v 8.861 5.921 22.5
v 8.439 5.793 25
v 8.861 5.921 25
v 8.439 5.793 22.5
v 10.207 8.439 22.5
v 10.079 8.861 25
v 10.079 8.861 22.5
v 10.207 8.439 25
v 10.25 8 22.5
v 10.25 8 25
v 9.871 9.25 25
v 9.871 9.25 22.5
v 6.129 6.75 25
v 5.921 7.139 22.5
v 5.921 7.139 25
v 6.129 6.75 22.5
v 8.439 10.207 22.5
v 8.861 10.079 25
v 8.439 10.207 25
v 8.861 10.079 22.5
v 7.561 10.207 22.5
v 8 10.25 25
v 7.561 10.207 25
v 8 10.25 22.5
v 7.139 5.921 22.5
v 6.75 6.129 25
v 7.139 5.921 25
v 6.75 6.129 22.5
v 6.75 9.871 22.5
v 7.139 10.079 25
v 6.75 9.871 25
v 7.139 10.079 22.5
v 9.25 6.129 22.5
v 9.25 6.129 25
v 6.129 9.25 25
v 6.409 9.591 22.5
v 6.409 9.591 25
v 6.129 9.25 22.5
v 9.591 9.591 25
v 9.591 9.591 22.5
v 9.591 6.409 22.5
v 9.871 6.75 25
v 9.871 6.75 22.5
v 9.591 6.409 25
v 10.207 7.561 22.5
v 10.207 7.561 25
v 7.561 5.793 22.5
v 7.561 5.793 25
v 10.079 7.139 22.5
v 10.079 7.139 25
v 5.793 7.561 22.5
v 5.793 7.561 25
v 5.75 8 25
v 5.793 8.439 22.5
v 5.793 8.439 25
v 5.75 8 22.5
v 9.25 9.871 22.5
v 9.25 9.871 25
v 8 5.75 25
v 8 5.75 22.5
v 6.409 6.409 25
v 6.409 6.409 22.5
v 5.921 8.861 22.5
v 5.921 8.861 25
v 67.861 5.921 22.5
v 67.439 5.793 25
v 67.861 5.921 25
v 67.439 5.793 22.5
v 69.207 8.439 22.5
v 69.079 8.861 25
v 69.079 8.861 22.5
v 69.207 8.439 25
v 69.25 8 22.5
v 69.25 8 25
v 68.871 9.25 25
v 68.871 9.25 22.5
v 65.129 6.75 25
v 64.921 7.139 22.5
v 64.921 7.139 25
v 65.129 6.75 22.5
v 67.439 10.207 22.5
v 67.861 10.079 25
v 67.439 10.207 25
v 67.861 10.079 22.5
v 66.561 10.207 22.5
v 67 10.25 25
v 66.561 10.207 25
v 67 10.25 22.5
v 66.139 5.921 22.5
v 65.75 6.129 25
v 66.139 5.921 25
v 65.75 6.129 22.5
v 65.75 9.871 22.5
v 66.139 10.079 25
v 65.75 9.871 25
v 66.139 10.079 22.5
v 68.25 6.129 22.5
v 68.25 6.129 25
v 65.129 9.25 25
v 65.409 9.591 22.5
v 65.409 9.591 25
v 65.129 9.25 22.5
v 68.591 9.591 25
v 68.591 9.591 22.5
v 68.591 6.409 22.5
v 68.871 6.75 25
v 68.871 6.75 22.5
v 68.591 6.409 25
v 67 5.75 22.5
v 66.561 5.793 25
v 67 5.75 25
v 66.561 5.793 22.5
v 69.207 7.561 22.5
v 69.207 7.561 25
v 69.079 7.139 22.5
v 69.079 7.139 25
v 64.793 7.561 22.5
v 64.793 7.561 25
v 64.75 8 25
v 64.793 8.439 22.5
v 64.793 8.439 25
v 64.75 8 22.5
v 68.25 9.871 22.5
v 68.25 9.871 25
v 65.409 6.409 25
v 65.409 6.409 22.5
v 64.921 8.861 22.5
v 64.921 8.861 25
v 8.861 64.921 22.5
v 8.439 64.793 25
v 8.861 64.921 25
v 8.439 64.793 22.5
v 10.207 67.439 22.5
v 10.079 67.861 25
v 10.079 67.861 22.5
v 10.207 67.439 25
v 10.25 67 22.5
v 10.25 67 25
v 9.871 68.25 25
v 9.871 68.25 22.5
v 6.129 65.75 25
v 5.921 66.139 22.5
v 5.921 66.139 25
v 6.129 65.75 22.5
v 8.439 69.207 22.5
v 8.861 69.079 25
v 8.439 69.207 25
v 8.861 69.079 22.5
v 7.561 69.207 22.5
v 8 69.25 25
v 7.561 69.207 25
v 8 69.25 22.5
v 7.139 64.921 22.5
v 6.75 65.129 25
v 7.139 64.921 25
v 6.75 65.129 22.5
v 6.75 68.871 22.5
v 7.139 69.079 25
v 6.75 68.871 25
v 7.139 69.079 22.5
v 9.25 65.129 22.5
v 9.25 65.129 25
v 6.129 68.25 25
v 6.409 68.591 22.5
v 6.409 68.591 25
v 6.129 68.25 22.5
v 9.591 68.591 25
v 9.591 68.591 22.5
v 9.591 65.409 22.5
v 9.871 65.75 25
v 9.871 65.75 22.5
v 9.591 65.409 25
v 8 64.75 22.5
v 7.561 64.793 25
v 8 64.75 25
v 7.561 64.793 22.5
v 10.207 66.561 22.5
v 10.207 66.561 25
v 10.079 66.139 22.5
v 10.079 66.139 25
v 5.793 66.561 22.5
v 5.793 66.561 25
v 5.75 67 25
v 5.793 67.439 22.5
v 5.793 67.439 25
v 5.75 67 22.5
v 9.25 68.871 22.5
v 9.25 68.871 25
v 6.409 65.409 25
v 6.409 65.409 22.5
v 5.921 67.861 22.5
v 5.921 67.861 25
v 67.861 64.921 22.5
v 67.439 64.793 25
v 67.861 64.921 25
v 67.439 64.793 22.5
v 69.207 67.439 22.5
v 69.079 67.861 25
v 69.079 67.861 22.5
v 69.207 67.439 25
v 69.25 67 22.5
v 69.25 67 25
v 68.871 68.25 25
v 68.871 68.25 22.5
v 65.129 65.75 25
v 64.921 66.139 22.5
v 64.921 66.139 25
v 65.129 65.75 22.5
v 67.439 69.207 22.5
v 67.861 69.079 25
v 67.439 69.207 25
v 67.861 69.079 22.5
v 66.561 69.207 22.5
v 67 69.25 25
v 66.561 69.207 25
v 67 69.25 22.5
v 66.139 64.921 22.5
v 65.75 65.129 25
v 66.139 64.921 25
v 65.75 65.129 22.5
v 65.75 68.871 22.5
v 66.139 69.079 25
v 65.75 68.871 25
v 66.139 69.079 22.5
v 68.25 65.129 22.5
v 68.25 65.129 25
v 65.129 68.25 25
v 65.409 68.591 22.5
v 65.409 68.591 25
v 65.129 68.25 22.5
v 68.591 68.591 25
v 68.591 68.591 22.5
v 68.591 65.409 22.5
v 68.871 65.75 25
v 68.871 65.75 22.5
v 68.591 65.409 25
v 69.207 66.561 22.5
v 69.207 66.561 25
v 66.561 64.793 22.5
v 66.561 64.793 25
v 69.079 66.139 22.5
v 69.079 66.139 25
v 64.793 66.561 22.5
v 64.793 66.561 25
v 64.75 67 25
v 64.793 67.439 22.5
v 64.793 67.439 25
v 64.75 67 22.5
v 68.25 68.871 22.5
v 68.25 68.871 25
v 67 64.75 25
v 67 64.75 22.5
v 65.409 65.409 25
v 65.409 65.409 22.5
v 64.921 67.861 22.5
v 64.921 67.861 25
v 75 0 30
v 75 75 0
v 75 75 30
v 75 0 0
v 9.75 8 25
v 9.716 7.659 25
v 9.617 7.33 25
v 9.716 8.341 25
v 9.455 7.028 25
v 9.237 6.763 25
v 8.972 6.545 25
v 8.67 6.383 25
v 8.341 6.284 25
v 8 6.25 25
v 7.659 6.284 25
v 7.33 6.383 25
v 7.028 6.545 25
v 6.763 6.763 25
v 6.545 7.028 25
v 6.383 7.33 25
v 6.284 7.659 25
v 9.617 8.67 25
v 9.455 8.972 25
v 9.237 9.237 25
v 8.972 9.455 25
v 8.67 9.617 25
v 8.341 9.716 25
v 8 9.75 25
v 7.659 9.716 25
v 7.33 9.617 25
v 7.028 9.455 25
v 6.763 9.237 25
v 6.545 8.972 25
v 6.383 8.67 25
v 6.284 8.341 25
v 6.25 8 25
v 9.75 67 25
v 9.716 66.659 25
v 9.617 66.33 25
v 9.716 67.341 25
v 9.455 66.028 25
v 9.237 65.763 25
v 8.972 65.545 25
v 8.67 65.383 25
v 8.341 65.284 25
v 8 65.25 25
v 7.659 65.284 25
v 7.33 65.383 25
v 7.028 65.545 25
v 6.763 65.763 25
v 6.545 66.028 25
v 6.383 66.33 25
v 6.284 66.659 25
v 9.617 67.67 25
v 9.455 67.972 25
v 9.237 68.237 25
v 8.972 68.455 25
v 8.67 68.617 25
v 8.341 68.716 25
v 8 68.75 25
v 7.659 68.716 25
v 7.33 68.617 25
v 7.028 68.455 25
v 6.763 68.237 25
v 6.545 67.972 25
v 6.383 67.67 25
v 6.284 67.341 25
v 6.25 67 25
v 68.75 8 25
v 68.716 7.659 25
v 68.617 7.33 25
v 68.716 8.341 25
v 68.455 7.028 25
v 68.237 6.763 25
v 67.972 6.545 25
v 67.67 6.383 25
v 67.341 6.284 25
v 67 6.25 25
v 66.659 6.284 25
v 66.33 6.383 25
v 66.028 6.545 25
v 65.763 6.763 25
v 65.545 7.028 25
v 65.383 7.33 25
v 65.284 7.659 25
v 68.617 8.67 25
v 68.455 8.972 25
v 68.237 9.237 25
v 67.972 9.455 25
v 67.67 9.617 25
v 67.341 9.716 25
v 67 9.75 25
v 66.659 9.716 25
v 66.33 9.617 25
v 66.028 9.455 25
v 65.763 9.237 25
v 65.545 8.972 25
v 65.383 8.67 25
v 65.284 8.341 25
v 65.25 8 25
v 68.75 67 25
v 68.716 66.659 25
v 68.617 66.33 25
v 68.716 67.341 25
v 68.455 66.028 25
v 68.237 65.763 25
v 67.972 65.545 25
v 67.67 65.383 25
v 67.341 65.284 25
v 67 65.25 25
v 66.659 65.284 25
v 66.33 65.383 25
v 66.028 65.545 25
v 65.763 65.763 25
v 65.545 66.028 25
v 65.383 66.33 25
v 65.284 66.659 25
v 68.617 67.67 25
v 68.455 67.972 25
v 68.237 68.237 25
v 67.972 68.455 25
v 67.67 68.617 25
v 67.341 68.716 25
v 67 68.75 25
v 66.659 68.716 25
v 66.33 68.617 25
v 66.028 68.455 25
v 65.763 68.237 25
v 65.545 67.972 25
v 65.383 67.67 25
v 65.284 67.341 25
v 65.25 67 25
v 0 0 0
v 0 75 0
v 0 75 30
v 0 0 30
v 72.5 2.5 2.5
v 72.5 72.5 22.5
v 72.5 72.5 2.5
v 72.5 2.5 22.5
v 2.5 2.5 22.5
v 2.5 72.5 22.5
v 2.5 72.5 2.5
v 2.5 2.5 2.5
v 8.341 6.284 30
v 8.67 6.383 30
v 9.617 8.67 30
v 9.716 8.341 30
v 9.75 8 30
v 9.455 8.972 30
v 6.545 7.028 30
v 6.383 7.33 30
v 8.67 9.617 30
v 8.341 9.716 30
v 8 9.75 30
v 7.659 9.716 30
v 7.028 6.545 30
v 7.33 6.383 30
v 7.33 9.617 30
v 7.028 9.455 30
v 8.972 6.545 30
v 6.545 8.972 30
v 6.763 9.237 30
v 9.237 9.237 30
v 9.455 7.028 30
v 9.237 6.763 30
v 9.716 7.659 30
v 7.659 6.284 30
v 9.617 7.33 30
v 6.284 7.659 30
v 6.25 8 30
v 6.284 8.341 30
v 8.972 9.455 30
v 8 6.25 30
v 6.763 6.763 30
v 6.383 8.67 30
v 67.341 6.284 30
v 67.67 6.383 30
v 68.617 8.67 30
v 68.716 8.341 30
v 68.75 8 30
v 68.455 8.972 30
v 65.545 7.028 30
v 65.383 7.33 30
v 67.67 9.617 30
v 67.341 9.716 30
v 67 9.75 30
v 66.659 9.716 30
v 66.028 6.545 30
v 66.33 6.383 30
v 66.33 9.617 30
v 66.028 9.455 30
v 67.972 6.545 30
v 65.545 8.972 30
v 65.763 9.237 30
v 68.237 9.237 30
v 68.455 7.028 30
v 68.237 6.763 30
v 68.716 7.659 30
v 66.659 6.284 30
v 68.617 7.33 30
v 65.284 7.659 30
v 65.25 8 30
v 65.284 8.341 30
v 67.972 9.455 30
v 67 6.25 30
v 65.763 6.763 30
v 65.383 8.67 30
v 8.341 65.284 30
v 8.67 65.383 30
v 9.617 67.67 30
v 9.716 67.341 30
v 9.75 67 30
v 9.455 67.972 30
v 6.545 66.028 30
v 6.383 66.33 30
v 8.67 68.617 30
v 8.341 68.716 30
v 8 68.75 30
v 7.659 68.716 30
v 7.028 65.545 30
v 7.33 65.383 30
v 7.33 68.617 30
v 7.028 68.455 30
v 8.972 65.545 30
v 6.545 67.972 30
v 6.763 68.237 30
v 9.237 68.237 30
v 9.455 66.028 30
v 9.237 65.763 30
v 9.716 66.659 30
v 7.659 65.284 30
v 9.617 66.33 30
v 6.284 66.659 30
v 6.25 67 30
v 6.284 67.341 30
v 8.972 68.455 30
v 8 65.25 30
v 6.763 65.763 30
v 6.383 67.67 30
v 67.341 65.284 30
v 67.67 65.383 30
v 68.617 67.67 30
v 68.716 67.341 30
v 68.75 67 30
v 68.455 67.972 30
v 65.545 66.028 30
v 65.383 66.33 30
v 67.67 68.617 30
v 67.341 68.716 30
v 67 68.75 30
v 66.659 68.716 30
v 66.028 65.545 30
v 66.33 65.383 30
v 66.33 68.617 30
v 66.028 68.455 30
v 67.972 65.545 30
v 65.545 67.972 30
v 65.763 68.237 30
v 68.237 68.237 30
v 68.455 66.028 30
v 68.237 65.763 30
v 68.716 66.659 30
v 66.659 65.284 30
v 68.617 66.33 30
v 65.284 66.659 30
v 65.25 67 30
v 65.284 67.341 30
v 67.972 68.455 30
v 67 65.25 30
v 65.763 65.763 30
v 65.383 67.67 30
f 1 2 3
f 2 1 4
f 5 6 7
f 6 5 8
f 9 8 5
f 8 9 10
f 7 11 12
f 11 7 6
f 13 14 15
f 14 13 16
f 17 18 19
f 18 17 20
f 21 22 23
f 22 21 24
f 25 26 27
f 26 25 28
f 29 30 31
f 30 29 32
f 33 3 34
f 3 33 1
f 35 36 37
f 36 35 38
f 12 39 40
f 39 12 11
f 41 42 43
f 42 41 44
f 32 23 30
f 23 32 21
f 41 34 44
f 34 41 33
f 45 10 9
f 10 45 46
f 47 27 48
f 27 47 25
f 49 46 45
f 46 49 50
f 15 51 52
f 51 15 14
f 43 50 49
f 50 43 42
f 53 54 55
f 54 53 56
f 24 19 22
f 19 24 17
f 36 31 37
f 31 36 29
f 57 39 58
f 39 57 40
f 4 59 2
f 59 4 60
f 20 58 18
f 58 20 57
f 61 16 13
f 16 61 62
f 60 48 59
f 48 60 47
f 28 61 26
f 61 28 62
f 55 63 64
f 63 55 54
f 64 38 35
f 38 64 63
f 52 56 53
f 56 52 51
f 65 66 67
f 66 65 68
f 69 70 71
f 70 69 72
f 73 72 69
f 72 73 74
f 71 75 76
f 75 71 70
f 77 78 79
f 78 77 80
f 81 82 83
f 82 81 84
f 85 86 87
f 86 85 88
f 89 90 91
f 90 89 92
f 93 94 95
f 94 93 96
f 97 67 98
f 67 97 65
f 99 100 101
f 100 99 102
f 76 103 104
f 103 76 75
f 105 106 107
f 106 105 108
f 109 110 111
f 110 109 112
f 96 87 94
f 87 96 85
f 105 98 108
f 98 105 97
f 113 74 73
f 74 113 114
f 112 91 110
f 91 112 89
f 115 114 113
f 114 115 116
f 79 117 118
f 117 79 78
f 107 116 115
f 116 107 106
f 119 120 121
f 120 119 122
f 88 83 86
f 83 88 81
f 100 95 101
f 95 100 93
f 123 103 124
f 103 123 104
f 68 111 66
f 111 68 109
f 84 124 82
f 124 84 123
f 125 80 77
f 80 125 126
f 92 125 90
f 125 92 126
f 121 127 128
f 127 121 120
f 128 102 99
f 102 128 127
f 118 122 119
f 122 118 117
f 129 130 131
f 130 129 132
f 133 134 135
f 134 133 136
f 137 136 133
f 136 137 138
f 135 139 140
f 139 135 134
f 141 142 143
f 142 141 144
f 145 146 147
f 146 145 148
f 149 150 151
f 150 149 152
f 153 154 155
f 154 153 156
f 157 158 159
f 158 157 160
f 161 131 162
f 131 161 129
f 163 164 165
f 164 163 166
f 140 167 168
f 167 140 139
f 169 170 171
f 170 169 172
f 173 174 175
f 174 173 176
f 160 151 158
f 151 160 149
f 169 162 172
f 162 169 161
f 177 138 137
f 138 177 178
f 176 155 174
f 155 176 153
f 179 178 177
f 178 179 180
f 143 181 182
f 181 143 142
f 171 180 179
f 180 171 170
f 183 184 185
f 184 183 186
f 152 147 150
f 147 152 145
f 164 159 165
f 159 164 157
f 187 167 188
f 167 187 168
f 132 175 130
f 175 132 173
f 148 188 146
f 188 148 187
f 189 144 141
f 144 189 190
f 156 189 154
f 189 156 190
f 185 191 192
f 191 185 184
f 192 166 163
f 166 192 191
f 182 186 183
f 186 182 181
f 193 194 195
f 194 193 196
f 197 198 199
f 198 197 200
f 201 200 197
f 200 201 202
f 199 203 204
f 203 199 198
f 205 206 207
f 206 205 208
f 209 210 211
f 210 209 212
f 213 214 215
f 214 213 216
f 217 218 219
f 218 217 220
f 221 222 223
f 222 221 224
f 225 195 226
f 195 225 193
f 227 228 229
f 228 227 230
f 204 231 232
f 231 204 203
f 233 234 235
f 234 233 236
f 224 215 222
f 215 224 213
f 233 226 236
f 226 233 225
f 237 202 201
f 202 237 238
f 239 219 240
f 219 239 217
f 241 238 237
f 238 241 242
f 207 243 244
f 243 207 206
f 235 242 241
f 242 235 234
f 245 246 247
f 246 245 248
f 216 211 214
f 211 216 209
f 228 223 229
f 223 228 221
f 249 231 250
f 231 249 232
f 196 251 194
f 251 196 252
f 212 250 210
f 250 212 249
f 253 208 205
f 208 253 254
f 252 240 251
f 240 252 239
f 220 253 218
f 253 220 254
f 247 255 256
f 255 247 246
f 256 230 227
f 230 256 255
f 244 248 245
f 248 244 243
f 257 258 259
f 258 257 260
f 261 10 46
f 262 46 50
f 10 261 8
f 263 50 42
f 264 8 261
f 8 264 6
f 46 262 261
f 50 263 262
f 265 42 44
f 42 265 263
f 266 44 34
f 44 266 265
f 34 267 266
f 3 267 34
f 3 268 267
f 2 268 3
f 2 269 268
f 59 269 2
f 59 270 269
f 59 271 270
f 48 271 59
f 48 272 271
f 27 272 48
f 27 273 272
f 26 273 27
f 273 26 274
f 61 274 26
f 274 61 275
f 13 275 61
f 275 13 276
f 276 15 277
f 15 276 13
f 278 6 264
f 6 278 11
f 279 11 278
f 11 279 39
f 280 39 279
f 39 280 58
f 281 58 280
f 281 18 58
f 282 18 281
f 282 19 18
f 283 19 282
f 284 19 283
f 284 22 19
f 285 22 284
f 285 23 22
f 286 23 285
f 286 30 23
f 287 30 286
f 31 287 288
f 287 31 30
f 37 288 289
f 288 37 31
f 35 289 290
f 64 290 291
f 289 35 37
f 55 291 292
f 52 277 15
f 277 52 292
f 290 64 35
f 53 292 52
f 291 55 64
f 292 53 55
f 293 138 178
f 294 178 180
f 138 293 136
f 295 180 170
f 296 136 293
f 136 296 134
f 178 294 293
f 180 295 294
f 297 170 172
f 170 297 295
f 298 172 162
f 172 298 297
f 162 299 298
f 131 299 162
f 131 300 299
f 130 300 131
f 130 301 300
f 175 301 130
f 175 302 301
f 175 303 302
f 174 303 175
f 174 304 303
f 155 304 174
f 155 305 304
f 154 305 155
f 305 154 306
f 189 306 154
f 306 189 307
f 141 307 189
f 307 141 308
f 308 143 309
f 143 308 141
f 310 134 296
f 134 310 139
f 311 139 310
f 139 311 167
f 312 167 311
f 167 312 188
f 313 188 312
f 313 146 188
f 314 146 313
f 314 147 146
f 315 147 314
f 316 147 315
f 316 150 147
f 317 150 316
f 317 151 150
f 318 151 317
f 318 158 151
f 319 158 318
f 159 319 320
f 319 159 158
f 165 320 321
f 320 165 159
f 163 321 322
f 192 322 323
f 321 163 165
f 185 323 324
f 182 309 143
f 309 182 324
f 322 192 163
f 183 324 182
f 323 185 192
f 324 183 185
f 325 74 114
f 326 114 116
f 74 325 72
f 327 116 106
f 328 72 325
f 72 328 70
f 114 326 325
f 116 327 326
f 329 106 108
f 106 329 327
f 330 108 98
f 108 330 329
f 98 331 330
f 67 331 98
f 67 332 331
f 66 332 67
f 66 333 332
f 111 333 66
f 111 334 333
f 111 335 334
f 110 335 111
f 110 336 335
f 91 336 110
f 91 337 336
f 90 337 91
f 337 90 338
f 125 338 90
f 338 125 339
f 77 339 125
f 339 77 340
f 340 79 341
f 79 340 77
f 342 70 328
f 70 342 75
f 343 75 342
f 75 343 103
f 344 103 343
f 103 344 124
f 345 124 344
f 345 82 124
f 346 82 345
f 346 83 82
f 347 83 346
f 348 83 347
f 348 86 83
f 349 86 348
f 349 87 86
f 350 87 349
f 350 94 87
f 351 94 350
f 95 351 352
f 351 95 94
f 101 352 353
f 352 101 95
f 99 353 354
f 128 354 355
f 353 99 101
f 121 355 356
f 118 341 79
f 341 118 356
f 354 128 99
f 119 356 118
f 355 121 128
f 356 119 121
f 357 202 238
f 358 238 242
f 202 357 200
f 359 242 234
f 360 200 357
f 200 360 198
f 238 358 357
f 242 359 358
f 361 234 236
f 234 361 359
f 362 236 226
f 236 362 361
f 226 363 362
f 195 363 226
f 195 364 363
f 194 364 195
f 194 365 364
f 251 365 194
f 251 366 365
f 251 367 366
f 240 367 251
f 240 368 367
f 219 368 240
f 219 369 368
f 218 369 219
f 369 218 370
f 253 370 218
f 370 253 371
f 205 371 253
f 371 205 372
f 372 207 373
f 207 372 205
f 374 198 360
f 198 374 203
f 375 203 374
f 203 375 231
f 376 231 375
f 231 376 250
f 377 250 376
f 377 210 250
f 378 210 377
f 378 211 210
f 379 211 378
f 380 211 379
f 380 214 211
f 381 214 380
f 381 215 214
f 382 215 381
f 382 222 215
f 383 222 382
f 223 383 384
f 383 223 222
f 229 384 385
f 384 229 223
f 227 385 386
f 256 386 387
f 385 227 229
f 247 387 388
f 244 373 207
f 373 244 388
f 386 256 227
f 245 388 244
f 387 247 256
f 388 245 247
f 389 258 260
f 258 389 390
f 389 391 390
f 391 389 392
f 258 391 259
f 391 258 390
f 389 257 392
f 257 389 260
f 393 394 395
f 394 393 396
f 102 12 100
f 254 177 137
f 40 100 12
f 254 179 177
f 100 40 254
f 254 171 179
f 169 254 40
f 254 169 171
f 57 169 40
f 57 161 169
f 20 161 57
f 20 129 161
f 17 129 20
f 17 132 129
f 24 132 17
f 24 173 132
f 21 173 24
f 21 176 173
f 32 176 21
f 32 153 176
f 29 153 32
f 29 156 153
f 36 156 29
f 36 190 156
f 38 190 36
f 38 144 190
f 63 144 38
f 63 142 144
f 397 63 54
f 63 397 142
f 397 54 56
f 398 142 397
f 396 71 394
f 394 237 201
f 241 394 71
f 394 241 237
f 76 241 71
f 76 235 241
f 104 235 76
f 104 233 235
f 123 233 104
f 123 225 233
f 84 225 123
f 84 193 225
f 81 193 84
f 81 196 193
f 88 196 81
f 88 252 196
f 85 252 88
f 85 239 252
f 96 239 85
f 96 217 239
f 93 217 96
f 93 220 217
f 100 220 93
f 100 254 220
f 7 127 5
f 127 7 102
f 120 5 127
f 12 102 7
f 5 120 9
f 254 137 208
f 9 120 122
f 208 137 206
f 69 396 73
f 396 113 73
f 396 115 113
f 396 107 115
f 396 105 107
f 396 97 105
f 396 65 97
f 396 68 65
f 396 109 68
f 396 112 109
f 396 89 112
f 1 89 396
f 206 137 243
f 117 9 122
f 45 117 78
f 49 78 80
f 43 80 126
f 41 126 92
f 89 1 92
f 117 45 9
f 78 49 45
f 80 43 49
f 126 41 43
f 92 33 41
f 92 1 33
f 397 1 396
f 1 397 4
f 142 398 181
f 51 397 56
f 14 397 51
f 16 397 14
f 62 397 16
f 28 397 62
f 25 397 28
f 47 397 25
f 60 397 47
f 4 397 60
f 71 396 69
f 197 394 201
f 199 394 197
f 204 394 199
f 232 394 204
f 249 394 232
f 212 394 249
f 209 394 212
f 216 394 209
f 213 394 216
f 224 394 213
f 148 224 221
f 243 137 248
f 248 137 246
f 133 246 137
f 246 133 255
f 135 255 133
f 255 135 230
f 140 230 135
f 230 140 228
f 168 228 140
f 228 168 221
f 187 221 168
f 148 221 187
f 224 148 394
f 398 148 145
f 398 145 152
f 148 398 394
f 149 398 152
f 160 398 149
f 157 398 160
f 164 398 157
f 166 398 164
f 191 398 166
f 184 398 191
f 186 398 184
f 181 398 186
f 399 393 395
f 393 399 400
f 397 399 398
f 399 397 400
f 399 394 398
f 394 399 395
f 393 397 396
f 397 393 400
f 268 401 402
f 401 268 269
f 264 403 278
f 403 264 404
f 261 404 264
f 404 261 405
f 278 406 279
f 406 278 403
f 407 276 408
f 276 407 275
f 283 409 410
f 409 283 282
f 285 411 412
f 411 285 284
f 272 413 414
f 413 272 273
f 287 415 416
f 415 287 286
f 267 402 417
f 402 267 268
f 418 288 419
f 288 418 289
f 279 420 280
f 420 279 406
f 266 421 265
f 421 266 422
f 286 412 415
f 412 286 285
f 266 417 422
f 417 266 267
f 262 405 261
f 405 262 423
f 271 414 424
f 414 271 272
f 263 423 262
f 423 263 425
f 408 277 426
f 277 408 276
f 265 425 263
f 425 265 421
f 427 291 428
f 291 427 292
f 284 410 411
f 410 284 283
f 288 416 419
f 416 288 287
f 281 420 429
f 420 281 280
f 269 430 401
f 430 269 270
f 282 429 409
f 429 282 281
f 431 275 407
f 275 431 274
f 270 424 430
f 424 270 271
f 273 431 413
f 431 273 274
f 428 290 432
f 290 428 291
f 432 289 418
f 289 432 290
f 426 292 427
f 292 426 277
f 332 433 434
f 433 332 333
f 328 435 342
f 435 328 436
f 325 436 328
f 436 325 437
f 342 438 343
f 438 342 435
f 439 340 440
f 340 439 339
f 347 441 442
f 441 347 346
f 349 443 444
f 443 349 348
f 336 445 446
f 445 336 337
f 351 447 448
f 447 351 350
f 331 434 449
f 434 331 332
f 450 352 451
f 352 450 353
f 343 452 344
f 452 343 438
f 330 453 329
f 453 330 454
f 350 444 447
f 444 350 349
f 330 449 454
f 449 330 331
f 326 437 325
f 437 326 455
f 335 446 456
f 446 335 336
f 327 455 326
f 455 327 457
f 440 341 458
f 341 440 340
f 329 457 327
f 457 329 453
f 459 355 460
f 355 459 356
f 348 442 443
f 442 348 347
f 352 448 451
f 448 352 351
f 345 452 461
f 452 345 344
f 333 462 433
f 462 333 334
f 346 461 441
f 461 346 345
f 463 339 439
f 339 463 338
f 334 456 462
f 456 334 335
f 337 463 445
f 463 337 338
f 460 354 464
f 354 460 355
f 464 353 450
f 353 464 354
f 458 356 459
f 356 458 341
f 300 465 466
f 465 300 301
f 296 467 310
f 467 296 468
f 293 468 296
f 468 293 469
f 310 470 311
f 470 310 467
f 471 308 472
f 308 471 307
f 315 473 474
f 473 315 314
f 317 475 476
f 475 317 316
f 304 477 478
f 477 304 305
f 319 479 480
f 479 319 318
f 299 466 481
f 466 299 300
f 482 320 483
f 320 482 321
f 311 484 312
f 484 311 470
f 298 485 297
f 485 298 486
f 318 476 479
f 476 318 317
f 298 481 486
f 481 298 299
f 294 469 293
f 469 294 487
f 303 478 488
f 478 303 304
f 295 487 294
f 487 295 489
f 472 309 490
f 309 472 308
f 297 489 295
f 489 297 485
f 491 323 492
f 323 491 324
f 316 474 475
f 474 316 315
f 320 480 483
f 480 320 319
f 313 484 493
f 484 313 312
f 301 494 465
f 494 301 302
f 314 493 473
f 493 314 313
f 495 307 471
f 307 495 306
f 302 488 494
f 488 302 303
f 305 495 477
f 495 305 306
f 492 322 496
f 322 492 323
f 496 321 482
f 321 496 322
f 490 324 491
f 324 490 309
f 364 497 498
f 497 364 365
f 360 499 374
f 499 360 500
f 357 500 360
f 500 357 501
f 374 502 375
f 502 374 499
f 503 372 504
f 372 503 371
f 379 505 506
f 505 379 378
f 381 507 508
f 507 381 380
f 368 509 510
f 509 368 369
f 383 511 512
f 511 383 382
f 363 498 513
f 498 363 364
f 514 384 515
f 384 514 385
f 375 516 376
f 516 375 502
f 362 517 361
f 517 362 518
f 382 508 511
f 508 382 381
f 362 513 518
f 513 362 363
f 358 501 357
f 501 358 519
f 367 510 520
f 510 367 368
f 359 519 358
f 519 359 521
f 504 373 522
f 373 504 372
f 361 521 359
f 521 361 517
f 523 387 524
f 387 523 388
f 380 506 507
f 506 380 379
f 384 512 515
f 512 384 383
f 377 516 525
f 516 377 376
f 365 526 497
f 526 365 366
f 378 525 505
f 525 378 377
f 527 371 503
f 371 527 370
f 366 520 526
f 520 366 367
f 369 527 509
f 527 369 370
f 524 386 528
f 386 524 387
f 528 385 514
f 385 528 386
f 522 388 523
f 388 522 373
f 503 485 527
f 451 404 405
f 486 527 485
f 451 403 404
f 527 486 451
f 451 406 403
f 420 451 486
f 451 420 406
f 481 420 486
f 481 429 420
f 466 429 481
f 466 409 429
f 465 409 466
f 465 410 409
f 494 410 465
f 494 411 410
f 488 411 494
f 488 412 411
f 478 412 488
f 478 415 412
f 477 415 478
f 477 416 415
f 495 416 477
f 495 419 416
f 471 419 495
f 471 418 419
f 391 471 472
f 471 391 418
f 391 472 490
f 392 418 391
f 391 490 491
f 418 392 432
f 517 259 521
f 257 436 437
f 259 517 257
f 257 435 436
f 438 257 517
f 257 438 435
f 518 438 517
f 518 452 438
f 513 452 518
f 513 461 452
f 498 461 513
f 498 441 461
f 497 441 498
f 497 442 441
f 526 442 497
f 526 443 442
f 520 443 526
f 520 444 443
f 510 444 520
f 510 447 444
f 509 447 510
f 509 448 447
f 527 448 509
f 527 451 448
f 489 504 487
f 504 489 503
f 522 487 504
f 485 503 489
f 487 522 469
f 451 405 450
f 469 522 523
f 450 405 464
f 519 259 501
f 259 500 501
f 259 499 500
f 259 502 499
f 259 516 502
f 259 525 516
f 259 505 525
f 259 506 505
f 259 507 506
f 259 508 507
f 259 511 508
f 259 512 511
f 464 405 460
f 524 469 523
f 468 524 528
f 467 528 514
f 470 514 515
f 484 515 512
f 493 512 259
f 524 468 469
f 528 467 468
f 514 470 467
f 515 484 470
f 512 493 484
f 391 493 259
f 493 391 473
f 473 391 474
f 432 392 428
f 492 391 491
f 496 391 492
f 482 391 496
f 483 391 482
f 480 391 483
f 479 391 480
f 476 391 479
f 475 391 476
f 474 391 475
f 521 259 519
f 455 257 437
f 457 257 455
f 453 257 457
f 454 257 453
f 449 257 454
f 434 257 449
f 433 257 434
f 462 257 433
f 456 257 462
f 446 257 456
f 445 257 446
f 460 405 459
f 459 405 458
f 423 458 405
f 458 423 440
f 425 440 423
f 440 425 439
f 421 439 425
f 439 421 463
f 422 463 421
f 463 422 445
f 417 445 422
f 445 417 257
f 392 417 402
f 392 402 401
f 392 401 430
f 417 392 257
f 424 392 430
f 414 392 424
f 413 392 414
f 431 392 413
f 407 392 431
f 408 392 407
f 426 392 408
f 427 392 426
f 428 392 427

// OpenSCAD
// Two-part enclosure with M3 socket-head cap screw fasteners
// Base with heat-set insert bores, Lid with clearance holes

// Internal cavity dimensions
cavity_x = 70;
cavity_y = 70;
cavity_z = 20;

wall_thickness = 2.5;

// Derived base dimensions
base_x = cavity_x + 2 * wall_thickness;  // 75 mm
base_y = cavity_y + 2 * wall_thickness;  // 75 mm
base_z = cavity_z + 2 * wall_thickness;  // 25 mm

lid_z = 5;

// Fastener positions (4 corners, 8 mm from edges)
fastener_positions = [
    [8, 8],
    [67, 8],
    [8, 67],
    [67, 67]
];

// M3 fastener specifications
m3_insert_bore_d = 4.5;   // Heat-set insert bore diameter
m3_clearance_d = 3.5;     // M3 screw clearance hole diameter
m3_insert_depth = 7;      // Insert bore depth into base

// === BASE ===
module base() {
    difference() {
        // Solid block
        cube([base_x, base_y, base_z]);
        
        // Internal cavity
        translate([wall_thickness, wall_thickness, wall_thickness])
            cube([cavity_x, cavity_y, cavity_z]);
        
        // M3 heat-set insert bores (top surface)
        for (pos = fastener_positions) {
            translate([pos[0], pos[1], base_z - m3_insert_depth])
                cylinder(d=m3_insert_bore_d, h=m3_insert_depth + 0.1, $fn=32);
        }
    }
}

// === LID ===
module lid() {
    difference() {
        // Solid block
        cube([base_x, base_y, lid_z]);
        
        // M3 clearance holes (through lid)
        for (pos = fastener_positions) {
            translate([pos[0], pos[1], -0.1])
                cylinder(d=m3_clearance_d, h=lid_z + 0.2, $fn=32);
        }
    }
}

// === RENDER IN ASSEMBLED POSITION ===
base();
translate([0, 0, base_z])
    lid();
